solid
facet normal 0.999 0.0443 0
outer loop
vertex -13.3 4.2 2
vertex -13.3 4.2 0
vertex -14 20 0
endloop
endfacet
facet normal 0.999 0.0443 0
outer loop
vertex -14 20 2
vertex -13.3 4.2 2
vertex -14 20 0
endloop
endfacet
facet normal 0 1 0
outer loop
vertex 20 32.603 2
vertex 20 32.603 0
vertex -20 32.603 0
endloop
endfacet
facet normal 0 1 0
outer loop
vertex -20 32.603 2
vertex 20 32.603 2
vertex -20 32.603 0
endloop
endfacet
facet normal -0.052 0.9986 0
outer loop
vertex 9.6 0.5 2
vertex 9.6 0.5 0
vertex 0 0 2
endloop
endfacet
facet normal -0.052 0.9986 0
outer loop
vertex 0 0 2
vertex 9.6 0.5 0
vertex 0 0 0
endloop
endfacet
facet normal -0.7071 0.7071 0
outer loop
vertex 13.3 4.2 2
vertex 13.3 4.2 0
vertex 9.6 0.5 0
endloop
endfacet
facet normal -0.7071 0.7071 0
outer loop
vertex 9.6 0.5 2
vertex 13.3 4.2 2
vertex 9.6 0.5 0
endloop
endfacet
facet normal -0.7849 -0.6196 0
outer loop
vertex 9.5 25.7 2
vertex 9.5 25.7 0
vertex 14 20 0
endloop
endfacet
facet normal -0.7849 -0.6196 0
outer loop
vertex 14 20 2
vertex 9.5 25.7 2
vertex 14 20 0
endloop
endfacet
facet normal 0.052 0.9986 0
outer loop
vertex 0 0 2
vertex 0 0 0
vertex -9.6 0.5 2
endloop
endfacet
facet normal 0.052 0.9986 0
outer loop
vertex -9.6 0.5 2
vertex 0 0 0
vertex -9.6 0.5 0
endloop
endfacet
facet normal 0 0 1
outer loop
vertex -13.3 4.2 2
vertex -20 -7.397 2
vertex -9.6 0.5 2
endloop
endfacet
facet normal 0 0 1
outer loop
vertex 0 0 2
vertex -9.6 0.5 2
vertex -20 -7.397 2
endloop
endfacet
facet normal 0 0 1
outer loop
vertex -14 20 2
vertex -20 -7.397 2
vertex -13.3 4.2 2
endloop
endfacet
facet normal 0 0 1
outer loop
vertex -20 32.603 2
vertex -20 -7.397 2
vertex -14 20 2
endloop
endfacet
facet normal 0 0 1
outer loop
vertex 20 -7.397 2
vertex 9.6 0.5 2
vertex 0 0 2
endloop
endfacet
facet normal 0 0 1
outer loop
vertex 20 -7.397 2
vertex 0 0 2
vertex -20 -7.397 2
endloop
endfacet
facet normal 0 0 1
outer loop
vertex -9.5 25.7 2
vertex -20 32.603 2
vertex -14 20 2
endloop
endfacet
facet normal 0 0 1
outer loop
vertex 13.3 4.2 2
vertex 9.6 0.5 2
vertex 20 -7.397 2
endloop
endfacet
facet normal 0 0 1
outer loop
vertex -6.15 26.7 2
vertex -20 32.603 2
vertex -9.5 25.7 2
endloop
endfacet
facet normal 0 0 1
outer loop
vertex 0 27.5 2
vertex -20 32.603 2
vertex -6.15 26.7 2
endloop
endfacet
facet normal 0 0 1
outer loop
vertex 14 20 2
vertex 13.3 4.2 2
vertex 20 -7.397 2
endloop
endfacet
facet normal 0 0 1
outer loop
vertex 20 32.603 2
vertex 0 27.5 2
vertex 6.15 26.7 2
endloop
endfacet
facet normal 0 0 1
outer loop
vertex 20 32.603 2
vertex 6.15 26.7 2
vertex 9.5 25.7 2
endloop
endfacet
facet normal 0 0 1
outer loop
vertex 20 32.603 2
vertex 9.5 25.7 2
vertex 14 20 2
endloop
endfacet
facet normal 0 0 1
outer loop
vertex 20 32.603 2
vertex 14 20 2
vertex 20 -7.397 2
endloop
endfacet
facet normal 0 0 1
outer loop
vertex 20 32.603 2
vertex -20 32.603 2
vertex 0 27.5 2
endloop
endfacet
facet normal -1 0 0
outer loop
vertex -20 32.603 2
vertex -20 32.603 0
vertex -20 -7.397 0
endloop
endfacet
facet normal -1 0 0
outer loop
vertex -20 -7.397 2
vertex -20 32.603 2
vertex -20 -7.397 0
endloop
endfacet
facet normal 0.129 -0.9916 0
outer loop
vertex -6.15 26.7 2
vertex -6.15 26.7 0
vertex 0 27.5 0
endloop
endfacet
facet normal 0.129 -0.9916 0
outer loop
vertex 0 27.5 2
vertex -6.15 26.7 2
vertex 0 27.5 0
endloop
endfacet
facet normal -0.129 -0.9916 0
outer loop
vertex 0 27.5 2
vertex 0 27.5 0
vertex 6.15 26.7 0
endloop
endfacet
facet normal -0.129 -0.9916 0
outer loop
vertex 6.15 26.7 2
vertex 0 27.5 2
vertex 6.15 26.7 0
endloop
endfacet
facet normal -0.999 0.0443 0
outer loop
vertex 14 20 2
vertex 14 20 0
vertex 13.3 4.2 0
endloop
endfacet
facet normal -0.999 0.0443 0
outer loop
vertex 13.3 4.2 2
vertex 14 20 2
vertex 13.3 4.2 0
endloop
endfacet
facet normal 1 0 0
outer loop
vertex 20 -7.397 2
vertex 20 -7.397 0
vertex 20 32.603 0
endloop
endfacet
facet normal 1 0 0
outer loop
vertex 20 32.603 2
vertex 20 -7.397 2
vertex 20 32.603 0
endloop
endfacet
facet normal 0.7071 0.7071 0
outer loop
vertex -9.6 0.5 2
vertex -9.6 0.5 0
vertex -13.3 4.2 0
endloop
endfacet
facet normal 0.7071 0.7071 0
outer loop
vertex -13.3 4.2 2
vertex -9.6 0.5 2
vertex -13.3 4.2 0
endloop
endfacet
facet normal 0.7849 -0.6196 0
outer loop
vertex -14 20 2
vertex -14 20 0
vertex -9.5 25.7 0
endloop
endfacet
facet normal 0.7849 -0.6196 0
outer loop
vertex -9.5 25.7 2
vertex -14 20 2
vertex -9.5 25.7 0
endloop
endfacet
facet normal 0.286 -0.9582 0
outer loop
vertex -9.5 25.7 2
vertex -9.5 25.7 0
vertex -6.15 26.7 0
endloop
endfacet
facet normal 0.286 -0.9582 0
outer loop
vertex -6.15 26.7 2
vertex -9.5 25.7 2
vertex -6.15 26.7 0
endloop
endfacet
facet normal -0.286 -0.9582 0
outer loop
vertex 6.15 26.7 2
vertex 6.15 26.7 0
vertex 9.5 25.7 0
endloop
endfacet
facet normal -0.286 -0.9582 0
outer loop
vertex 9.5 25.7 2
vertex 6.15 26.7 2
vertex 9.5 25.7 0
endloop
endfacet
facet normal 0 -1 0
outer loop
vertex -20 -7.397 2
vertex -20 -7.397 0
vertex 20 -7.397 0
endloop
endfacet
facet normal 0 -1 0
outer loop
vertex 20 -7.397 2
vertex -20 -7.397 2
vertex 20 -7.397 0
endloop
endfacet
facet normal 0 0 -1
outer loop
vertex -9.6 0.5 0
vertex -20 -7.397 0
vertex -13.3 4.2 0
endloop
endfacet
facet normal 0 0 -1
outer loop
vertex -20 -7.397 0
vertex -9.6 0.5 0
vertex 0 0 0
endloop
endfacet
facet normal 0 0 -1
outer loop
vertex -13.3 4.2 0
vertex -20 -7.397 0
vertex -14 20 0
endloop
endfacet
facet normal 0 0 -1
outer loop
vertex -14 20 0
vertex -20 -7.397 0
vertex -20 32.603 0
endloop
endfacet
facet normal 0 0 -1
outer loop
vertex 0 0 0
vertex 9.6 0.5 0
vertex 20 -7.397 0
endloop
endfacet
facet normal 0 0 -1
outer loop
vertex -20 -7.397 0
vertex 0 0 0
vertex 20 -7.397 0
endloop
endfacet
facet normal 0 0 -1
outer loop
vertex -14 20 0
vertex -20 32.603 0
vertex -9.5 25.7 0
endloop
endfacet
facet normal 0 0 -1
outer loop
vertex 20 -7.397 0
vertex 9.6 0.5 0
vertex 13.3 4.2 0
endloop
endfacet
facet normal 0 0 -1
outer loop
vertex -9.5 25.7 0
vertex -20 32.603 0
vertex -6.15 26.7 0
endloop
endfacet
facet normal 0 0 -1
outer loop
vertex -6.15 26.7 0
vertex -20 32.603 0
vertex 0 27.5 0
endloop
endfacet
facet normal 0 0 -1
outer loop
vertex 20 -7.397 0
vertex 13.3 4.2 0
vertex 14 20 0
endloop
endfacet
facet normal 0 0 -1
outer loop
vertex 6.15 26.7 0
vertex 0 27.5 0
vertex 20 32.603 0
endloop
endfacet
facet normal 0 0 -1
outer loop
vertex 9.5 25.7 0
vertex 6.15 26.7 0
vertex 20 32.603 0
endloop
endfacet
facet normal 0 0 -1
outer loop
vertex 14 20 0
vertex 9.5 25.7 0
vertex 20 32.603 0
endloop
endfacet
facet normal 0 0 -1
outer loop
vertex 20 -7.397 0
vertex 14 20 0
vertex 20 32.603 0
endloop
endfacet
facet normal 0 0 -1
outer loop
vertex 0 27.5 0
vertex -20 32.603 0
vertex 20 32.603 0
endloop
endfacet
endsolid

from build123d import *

# Parameters (mm, degrees)
F1_DEPTH = 2


with BuildPart() as f1:
    # F0 (on Top) → F1 (new body)
    with BuildSketch(Plane.XY):
        Polygon((-20, -7.397476), (0, -7.397476), (20, -7.397476), (20, 32.602524), (0, 32.602524), (-20, 32.602524), align=None)
        Polygon((6.15, 26.7), (9.5, 25.7), (14, 20), (13.3, 4.2), (9.6, 0.5), (0, 0), (-9.6, 0.5), (-13.3, 4.2), (-14, 20), (-9.5, 25.7), (-6.15, 26.7), (0, 27.5), align=None, mode=Mode.SUBTRACT)
    extrude(amount=F1_DEPTH)


solid = f1.part
